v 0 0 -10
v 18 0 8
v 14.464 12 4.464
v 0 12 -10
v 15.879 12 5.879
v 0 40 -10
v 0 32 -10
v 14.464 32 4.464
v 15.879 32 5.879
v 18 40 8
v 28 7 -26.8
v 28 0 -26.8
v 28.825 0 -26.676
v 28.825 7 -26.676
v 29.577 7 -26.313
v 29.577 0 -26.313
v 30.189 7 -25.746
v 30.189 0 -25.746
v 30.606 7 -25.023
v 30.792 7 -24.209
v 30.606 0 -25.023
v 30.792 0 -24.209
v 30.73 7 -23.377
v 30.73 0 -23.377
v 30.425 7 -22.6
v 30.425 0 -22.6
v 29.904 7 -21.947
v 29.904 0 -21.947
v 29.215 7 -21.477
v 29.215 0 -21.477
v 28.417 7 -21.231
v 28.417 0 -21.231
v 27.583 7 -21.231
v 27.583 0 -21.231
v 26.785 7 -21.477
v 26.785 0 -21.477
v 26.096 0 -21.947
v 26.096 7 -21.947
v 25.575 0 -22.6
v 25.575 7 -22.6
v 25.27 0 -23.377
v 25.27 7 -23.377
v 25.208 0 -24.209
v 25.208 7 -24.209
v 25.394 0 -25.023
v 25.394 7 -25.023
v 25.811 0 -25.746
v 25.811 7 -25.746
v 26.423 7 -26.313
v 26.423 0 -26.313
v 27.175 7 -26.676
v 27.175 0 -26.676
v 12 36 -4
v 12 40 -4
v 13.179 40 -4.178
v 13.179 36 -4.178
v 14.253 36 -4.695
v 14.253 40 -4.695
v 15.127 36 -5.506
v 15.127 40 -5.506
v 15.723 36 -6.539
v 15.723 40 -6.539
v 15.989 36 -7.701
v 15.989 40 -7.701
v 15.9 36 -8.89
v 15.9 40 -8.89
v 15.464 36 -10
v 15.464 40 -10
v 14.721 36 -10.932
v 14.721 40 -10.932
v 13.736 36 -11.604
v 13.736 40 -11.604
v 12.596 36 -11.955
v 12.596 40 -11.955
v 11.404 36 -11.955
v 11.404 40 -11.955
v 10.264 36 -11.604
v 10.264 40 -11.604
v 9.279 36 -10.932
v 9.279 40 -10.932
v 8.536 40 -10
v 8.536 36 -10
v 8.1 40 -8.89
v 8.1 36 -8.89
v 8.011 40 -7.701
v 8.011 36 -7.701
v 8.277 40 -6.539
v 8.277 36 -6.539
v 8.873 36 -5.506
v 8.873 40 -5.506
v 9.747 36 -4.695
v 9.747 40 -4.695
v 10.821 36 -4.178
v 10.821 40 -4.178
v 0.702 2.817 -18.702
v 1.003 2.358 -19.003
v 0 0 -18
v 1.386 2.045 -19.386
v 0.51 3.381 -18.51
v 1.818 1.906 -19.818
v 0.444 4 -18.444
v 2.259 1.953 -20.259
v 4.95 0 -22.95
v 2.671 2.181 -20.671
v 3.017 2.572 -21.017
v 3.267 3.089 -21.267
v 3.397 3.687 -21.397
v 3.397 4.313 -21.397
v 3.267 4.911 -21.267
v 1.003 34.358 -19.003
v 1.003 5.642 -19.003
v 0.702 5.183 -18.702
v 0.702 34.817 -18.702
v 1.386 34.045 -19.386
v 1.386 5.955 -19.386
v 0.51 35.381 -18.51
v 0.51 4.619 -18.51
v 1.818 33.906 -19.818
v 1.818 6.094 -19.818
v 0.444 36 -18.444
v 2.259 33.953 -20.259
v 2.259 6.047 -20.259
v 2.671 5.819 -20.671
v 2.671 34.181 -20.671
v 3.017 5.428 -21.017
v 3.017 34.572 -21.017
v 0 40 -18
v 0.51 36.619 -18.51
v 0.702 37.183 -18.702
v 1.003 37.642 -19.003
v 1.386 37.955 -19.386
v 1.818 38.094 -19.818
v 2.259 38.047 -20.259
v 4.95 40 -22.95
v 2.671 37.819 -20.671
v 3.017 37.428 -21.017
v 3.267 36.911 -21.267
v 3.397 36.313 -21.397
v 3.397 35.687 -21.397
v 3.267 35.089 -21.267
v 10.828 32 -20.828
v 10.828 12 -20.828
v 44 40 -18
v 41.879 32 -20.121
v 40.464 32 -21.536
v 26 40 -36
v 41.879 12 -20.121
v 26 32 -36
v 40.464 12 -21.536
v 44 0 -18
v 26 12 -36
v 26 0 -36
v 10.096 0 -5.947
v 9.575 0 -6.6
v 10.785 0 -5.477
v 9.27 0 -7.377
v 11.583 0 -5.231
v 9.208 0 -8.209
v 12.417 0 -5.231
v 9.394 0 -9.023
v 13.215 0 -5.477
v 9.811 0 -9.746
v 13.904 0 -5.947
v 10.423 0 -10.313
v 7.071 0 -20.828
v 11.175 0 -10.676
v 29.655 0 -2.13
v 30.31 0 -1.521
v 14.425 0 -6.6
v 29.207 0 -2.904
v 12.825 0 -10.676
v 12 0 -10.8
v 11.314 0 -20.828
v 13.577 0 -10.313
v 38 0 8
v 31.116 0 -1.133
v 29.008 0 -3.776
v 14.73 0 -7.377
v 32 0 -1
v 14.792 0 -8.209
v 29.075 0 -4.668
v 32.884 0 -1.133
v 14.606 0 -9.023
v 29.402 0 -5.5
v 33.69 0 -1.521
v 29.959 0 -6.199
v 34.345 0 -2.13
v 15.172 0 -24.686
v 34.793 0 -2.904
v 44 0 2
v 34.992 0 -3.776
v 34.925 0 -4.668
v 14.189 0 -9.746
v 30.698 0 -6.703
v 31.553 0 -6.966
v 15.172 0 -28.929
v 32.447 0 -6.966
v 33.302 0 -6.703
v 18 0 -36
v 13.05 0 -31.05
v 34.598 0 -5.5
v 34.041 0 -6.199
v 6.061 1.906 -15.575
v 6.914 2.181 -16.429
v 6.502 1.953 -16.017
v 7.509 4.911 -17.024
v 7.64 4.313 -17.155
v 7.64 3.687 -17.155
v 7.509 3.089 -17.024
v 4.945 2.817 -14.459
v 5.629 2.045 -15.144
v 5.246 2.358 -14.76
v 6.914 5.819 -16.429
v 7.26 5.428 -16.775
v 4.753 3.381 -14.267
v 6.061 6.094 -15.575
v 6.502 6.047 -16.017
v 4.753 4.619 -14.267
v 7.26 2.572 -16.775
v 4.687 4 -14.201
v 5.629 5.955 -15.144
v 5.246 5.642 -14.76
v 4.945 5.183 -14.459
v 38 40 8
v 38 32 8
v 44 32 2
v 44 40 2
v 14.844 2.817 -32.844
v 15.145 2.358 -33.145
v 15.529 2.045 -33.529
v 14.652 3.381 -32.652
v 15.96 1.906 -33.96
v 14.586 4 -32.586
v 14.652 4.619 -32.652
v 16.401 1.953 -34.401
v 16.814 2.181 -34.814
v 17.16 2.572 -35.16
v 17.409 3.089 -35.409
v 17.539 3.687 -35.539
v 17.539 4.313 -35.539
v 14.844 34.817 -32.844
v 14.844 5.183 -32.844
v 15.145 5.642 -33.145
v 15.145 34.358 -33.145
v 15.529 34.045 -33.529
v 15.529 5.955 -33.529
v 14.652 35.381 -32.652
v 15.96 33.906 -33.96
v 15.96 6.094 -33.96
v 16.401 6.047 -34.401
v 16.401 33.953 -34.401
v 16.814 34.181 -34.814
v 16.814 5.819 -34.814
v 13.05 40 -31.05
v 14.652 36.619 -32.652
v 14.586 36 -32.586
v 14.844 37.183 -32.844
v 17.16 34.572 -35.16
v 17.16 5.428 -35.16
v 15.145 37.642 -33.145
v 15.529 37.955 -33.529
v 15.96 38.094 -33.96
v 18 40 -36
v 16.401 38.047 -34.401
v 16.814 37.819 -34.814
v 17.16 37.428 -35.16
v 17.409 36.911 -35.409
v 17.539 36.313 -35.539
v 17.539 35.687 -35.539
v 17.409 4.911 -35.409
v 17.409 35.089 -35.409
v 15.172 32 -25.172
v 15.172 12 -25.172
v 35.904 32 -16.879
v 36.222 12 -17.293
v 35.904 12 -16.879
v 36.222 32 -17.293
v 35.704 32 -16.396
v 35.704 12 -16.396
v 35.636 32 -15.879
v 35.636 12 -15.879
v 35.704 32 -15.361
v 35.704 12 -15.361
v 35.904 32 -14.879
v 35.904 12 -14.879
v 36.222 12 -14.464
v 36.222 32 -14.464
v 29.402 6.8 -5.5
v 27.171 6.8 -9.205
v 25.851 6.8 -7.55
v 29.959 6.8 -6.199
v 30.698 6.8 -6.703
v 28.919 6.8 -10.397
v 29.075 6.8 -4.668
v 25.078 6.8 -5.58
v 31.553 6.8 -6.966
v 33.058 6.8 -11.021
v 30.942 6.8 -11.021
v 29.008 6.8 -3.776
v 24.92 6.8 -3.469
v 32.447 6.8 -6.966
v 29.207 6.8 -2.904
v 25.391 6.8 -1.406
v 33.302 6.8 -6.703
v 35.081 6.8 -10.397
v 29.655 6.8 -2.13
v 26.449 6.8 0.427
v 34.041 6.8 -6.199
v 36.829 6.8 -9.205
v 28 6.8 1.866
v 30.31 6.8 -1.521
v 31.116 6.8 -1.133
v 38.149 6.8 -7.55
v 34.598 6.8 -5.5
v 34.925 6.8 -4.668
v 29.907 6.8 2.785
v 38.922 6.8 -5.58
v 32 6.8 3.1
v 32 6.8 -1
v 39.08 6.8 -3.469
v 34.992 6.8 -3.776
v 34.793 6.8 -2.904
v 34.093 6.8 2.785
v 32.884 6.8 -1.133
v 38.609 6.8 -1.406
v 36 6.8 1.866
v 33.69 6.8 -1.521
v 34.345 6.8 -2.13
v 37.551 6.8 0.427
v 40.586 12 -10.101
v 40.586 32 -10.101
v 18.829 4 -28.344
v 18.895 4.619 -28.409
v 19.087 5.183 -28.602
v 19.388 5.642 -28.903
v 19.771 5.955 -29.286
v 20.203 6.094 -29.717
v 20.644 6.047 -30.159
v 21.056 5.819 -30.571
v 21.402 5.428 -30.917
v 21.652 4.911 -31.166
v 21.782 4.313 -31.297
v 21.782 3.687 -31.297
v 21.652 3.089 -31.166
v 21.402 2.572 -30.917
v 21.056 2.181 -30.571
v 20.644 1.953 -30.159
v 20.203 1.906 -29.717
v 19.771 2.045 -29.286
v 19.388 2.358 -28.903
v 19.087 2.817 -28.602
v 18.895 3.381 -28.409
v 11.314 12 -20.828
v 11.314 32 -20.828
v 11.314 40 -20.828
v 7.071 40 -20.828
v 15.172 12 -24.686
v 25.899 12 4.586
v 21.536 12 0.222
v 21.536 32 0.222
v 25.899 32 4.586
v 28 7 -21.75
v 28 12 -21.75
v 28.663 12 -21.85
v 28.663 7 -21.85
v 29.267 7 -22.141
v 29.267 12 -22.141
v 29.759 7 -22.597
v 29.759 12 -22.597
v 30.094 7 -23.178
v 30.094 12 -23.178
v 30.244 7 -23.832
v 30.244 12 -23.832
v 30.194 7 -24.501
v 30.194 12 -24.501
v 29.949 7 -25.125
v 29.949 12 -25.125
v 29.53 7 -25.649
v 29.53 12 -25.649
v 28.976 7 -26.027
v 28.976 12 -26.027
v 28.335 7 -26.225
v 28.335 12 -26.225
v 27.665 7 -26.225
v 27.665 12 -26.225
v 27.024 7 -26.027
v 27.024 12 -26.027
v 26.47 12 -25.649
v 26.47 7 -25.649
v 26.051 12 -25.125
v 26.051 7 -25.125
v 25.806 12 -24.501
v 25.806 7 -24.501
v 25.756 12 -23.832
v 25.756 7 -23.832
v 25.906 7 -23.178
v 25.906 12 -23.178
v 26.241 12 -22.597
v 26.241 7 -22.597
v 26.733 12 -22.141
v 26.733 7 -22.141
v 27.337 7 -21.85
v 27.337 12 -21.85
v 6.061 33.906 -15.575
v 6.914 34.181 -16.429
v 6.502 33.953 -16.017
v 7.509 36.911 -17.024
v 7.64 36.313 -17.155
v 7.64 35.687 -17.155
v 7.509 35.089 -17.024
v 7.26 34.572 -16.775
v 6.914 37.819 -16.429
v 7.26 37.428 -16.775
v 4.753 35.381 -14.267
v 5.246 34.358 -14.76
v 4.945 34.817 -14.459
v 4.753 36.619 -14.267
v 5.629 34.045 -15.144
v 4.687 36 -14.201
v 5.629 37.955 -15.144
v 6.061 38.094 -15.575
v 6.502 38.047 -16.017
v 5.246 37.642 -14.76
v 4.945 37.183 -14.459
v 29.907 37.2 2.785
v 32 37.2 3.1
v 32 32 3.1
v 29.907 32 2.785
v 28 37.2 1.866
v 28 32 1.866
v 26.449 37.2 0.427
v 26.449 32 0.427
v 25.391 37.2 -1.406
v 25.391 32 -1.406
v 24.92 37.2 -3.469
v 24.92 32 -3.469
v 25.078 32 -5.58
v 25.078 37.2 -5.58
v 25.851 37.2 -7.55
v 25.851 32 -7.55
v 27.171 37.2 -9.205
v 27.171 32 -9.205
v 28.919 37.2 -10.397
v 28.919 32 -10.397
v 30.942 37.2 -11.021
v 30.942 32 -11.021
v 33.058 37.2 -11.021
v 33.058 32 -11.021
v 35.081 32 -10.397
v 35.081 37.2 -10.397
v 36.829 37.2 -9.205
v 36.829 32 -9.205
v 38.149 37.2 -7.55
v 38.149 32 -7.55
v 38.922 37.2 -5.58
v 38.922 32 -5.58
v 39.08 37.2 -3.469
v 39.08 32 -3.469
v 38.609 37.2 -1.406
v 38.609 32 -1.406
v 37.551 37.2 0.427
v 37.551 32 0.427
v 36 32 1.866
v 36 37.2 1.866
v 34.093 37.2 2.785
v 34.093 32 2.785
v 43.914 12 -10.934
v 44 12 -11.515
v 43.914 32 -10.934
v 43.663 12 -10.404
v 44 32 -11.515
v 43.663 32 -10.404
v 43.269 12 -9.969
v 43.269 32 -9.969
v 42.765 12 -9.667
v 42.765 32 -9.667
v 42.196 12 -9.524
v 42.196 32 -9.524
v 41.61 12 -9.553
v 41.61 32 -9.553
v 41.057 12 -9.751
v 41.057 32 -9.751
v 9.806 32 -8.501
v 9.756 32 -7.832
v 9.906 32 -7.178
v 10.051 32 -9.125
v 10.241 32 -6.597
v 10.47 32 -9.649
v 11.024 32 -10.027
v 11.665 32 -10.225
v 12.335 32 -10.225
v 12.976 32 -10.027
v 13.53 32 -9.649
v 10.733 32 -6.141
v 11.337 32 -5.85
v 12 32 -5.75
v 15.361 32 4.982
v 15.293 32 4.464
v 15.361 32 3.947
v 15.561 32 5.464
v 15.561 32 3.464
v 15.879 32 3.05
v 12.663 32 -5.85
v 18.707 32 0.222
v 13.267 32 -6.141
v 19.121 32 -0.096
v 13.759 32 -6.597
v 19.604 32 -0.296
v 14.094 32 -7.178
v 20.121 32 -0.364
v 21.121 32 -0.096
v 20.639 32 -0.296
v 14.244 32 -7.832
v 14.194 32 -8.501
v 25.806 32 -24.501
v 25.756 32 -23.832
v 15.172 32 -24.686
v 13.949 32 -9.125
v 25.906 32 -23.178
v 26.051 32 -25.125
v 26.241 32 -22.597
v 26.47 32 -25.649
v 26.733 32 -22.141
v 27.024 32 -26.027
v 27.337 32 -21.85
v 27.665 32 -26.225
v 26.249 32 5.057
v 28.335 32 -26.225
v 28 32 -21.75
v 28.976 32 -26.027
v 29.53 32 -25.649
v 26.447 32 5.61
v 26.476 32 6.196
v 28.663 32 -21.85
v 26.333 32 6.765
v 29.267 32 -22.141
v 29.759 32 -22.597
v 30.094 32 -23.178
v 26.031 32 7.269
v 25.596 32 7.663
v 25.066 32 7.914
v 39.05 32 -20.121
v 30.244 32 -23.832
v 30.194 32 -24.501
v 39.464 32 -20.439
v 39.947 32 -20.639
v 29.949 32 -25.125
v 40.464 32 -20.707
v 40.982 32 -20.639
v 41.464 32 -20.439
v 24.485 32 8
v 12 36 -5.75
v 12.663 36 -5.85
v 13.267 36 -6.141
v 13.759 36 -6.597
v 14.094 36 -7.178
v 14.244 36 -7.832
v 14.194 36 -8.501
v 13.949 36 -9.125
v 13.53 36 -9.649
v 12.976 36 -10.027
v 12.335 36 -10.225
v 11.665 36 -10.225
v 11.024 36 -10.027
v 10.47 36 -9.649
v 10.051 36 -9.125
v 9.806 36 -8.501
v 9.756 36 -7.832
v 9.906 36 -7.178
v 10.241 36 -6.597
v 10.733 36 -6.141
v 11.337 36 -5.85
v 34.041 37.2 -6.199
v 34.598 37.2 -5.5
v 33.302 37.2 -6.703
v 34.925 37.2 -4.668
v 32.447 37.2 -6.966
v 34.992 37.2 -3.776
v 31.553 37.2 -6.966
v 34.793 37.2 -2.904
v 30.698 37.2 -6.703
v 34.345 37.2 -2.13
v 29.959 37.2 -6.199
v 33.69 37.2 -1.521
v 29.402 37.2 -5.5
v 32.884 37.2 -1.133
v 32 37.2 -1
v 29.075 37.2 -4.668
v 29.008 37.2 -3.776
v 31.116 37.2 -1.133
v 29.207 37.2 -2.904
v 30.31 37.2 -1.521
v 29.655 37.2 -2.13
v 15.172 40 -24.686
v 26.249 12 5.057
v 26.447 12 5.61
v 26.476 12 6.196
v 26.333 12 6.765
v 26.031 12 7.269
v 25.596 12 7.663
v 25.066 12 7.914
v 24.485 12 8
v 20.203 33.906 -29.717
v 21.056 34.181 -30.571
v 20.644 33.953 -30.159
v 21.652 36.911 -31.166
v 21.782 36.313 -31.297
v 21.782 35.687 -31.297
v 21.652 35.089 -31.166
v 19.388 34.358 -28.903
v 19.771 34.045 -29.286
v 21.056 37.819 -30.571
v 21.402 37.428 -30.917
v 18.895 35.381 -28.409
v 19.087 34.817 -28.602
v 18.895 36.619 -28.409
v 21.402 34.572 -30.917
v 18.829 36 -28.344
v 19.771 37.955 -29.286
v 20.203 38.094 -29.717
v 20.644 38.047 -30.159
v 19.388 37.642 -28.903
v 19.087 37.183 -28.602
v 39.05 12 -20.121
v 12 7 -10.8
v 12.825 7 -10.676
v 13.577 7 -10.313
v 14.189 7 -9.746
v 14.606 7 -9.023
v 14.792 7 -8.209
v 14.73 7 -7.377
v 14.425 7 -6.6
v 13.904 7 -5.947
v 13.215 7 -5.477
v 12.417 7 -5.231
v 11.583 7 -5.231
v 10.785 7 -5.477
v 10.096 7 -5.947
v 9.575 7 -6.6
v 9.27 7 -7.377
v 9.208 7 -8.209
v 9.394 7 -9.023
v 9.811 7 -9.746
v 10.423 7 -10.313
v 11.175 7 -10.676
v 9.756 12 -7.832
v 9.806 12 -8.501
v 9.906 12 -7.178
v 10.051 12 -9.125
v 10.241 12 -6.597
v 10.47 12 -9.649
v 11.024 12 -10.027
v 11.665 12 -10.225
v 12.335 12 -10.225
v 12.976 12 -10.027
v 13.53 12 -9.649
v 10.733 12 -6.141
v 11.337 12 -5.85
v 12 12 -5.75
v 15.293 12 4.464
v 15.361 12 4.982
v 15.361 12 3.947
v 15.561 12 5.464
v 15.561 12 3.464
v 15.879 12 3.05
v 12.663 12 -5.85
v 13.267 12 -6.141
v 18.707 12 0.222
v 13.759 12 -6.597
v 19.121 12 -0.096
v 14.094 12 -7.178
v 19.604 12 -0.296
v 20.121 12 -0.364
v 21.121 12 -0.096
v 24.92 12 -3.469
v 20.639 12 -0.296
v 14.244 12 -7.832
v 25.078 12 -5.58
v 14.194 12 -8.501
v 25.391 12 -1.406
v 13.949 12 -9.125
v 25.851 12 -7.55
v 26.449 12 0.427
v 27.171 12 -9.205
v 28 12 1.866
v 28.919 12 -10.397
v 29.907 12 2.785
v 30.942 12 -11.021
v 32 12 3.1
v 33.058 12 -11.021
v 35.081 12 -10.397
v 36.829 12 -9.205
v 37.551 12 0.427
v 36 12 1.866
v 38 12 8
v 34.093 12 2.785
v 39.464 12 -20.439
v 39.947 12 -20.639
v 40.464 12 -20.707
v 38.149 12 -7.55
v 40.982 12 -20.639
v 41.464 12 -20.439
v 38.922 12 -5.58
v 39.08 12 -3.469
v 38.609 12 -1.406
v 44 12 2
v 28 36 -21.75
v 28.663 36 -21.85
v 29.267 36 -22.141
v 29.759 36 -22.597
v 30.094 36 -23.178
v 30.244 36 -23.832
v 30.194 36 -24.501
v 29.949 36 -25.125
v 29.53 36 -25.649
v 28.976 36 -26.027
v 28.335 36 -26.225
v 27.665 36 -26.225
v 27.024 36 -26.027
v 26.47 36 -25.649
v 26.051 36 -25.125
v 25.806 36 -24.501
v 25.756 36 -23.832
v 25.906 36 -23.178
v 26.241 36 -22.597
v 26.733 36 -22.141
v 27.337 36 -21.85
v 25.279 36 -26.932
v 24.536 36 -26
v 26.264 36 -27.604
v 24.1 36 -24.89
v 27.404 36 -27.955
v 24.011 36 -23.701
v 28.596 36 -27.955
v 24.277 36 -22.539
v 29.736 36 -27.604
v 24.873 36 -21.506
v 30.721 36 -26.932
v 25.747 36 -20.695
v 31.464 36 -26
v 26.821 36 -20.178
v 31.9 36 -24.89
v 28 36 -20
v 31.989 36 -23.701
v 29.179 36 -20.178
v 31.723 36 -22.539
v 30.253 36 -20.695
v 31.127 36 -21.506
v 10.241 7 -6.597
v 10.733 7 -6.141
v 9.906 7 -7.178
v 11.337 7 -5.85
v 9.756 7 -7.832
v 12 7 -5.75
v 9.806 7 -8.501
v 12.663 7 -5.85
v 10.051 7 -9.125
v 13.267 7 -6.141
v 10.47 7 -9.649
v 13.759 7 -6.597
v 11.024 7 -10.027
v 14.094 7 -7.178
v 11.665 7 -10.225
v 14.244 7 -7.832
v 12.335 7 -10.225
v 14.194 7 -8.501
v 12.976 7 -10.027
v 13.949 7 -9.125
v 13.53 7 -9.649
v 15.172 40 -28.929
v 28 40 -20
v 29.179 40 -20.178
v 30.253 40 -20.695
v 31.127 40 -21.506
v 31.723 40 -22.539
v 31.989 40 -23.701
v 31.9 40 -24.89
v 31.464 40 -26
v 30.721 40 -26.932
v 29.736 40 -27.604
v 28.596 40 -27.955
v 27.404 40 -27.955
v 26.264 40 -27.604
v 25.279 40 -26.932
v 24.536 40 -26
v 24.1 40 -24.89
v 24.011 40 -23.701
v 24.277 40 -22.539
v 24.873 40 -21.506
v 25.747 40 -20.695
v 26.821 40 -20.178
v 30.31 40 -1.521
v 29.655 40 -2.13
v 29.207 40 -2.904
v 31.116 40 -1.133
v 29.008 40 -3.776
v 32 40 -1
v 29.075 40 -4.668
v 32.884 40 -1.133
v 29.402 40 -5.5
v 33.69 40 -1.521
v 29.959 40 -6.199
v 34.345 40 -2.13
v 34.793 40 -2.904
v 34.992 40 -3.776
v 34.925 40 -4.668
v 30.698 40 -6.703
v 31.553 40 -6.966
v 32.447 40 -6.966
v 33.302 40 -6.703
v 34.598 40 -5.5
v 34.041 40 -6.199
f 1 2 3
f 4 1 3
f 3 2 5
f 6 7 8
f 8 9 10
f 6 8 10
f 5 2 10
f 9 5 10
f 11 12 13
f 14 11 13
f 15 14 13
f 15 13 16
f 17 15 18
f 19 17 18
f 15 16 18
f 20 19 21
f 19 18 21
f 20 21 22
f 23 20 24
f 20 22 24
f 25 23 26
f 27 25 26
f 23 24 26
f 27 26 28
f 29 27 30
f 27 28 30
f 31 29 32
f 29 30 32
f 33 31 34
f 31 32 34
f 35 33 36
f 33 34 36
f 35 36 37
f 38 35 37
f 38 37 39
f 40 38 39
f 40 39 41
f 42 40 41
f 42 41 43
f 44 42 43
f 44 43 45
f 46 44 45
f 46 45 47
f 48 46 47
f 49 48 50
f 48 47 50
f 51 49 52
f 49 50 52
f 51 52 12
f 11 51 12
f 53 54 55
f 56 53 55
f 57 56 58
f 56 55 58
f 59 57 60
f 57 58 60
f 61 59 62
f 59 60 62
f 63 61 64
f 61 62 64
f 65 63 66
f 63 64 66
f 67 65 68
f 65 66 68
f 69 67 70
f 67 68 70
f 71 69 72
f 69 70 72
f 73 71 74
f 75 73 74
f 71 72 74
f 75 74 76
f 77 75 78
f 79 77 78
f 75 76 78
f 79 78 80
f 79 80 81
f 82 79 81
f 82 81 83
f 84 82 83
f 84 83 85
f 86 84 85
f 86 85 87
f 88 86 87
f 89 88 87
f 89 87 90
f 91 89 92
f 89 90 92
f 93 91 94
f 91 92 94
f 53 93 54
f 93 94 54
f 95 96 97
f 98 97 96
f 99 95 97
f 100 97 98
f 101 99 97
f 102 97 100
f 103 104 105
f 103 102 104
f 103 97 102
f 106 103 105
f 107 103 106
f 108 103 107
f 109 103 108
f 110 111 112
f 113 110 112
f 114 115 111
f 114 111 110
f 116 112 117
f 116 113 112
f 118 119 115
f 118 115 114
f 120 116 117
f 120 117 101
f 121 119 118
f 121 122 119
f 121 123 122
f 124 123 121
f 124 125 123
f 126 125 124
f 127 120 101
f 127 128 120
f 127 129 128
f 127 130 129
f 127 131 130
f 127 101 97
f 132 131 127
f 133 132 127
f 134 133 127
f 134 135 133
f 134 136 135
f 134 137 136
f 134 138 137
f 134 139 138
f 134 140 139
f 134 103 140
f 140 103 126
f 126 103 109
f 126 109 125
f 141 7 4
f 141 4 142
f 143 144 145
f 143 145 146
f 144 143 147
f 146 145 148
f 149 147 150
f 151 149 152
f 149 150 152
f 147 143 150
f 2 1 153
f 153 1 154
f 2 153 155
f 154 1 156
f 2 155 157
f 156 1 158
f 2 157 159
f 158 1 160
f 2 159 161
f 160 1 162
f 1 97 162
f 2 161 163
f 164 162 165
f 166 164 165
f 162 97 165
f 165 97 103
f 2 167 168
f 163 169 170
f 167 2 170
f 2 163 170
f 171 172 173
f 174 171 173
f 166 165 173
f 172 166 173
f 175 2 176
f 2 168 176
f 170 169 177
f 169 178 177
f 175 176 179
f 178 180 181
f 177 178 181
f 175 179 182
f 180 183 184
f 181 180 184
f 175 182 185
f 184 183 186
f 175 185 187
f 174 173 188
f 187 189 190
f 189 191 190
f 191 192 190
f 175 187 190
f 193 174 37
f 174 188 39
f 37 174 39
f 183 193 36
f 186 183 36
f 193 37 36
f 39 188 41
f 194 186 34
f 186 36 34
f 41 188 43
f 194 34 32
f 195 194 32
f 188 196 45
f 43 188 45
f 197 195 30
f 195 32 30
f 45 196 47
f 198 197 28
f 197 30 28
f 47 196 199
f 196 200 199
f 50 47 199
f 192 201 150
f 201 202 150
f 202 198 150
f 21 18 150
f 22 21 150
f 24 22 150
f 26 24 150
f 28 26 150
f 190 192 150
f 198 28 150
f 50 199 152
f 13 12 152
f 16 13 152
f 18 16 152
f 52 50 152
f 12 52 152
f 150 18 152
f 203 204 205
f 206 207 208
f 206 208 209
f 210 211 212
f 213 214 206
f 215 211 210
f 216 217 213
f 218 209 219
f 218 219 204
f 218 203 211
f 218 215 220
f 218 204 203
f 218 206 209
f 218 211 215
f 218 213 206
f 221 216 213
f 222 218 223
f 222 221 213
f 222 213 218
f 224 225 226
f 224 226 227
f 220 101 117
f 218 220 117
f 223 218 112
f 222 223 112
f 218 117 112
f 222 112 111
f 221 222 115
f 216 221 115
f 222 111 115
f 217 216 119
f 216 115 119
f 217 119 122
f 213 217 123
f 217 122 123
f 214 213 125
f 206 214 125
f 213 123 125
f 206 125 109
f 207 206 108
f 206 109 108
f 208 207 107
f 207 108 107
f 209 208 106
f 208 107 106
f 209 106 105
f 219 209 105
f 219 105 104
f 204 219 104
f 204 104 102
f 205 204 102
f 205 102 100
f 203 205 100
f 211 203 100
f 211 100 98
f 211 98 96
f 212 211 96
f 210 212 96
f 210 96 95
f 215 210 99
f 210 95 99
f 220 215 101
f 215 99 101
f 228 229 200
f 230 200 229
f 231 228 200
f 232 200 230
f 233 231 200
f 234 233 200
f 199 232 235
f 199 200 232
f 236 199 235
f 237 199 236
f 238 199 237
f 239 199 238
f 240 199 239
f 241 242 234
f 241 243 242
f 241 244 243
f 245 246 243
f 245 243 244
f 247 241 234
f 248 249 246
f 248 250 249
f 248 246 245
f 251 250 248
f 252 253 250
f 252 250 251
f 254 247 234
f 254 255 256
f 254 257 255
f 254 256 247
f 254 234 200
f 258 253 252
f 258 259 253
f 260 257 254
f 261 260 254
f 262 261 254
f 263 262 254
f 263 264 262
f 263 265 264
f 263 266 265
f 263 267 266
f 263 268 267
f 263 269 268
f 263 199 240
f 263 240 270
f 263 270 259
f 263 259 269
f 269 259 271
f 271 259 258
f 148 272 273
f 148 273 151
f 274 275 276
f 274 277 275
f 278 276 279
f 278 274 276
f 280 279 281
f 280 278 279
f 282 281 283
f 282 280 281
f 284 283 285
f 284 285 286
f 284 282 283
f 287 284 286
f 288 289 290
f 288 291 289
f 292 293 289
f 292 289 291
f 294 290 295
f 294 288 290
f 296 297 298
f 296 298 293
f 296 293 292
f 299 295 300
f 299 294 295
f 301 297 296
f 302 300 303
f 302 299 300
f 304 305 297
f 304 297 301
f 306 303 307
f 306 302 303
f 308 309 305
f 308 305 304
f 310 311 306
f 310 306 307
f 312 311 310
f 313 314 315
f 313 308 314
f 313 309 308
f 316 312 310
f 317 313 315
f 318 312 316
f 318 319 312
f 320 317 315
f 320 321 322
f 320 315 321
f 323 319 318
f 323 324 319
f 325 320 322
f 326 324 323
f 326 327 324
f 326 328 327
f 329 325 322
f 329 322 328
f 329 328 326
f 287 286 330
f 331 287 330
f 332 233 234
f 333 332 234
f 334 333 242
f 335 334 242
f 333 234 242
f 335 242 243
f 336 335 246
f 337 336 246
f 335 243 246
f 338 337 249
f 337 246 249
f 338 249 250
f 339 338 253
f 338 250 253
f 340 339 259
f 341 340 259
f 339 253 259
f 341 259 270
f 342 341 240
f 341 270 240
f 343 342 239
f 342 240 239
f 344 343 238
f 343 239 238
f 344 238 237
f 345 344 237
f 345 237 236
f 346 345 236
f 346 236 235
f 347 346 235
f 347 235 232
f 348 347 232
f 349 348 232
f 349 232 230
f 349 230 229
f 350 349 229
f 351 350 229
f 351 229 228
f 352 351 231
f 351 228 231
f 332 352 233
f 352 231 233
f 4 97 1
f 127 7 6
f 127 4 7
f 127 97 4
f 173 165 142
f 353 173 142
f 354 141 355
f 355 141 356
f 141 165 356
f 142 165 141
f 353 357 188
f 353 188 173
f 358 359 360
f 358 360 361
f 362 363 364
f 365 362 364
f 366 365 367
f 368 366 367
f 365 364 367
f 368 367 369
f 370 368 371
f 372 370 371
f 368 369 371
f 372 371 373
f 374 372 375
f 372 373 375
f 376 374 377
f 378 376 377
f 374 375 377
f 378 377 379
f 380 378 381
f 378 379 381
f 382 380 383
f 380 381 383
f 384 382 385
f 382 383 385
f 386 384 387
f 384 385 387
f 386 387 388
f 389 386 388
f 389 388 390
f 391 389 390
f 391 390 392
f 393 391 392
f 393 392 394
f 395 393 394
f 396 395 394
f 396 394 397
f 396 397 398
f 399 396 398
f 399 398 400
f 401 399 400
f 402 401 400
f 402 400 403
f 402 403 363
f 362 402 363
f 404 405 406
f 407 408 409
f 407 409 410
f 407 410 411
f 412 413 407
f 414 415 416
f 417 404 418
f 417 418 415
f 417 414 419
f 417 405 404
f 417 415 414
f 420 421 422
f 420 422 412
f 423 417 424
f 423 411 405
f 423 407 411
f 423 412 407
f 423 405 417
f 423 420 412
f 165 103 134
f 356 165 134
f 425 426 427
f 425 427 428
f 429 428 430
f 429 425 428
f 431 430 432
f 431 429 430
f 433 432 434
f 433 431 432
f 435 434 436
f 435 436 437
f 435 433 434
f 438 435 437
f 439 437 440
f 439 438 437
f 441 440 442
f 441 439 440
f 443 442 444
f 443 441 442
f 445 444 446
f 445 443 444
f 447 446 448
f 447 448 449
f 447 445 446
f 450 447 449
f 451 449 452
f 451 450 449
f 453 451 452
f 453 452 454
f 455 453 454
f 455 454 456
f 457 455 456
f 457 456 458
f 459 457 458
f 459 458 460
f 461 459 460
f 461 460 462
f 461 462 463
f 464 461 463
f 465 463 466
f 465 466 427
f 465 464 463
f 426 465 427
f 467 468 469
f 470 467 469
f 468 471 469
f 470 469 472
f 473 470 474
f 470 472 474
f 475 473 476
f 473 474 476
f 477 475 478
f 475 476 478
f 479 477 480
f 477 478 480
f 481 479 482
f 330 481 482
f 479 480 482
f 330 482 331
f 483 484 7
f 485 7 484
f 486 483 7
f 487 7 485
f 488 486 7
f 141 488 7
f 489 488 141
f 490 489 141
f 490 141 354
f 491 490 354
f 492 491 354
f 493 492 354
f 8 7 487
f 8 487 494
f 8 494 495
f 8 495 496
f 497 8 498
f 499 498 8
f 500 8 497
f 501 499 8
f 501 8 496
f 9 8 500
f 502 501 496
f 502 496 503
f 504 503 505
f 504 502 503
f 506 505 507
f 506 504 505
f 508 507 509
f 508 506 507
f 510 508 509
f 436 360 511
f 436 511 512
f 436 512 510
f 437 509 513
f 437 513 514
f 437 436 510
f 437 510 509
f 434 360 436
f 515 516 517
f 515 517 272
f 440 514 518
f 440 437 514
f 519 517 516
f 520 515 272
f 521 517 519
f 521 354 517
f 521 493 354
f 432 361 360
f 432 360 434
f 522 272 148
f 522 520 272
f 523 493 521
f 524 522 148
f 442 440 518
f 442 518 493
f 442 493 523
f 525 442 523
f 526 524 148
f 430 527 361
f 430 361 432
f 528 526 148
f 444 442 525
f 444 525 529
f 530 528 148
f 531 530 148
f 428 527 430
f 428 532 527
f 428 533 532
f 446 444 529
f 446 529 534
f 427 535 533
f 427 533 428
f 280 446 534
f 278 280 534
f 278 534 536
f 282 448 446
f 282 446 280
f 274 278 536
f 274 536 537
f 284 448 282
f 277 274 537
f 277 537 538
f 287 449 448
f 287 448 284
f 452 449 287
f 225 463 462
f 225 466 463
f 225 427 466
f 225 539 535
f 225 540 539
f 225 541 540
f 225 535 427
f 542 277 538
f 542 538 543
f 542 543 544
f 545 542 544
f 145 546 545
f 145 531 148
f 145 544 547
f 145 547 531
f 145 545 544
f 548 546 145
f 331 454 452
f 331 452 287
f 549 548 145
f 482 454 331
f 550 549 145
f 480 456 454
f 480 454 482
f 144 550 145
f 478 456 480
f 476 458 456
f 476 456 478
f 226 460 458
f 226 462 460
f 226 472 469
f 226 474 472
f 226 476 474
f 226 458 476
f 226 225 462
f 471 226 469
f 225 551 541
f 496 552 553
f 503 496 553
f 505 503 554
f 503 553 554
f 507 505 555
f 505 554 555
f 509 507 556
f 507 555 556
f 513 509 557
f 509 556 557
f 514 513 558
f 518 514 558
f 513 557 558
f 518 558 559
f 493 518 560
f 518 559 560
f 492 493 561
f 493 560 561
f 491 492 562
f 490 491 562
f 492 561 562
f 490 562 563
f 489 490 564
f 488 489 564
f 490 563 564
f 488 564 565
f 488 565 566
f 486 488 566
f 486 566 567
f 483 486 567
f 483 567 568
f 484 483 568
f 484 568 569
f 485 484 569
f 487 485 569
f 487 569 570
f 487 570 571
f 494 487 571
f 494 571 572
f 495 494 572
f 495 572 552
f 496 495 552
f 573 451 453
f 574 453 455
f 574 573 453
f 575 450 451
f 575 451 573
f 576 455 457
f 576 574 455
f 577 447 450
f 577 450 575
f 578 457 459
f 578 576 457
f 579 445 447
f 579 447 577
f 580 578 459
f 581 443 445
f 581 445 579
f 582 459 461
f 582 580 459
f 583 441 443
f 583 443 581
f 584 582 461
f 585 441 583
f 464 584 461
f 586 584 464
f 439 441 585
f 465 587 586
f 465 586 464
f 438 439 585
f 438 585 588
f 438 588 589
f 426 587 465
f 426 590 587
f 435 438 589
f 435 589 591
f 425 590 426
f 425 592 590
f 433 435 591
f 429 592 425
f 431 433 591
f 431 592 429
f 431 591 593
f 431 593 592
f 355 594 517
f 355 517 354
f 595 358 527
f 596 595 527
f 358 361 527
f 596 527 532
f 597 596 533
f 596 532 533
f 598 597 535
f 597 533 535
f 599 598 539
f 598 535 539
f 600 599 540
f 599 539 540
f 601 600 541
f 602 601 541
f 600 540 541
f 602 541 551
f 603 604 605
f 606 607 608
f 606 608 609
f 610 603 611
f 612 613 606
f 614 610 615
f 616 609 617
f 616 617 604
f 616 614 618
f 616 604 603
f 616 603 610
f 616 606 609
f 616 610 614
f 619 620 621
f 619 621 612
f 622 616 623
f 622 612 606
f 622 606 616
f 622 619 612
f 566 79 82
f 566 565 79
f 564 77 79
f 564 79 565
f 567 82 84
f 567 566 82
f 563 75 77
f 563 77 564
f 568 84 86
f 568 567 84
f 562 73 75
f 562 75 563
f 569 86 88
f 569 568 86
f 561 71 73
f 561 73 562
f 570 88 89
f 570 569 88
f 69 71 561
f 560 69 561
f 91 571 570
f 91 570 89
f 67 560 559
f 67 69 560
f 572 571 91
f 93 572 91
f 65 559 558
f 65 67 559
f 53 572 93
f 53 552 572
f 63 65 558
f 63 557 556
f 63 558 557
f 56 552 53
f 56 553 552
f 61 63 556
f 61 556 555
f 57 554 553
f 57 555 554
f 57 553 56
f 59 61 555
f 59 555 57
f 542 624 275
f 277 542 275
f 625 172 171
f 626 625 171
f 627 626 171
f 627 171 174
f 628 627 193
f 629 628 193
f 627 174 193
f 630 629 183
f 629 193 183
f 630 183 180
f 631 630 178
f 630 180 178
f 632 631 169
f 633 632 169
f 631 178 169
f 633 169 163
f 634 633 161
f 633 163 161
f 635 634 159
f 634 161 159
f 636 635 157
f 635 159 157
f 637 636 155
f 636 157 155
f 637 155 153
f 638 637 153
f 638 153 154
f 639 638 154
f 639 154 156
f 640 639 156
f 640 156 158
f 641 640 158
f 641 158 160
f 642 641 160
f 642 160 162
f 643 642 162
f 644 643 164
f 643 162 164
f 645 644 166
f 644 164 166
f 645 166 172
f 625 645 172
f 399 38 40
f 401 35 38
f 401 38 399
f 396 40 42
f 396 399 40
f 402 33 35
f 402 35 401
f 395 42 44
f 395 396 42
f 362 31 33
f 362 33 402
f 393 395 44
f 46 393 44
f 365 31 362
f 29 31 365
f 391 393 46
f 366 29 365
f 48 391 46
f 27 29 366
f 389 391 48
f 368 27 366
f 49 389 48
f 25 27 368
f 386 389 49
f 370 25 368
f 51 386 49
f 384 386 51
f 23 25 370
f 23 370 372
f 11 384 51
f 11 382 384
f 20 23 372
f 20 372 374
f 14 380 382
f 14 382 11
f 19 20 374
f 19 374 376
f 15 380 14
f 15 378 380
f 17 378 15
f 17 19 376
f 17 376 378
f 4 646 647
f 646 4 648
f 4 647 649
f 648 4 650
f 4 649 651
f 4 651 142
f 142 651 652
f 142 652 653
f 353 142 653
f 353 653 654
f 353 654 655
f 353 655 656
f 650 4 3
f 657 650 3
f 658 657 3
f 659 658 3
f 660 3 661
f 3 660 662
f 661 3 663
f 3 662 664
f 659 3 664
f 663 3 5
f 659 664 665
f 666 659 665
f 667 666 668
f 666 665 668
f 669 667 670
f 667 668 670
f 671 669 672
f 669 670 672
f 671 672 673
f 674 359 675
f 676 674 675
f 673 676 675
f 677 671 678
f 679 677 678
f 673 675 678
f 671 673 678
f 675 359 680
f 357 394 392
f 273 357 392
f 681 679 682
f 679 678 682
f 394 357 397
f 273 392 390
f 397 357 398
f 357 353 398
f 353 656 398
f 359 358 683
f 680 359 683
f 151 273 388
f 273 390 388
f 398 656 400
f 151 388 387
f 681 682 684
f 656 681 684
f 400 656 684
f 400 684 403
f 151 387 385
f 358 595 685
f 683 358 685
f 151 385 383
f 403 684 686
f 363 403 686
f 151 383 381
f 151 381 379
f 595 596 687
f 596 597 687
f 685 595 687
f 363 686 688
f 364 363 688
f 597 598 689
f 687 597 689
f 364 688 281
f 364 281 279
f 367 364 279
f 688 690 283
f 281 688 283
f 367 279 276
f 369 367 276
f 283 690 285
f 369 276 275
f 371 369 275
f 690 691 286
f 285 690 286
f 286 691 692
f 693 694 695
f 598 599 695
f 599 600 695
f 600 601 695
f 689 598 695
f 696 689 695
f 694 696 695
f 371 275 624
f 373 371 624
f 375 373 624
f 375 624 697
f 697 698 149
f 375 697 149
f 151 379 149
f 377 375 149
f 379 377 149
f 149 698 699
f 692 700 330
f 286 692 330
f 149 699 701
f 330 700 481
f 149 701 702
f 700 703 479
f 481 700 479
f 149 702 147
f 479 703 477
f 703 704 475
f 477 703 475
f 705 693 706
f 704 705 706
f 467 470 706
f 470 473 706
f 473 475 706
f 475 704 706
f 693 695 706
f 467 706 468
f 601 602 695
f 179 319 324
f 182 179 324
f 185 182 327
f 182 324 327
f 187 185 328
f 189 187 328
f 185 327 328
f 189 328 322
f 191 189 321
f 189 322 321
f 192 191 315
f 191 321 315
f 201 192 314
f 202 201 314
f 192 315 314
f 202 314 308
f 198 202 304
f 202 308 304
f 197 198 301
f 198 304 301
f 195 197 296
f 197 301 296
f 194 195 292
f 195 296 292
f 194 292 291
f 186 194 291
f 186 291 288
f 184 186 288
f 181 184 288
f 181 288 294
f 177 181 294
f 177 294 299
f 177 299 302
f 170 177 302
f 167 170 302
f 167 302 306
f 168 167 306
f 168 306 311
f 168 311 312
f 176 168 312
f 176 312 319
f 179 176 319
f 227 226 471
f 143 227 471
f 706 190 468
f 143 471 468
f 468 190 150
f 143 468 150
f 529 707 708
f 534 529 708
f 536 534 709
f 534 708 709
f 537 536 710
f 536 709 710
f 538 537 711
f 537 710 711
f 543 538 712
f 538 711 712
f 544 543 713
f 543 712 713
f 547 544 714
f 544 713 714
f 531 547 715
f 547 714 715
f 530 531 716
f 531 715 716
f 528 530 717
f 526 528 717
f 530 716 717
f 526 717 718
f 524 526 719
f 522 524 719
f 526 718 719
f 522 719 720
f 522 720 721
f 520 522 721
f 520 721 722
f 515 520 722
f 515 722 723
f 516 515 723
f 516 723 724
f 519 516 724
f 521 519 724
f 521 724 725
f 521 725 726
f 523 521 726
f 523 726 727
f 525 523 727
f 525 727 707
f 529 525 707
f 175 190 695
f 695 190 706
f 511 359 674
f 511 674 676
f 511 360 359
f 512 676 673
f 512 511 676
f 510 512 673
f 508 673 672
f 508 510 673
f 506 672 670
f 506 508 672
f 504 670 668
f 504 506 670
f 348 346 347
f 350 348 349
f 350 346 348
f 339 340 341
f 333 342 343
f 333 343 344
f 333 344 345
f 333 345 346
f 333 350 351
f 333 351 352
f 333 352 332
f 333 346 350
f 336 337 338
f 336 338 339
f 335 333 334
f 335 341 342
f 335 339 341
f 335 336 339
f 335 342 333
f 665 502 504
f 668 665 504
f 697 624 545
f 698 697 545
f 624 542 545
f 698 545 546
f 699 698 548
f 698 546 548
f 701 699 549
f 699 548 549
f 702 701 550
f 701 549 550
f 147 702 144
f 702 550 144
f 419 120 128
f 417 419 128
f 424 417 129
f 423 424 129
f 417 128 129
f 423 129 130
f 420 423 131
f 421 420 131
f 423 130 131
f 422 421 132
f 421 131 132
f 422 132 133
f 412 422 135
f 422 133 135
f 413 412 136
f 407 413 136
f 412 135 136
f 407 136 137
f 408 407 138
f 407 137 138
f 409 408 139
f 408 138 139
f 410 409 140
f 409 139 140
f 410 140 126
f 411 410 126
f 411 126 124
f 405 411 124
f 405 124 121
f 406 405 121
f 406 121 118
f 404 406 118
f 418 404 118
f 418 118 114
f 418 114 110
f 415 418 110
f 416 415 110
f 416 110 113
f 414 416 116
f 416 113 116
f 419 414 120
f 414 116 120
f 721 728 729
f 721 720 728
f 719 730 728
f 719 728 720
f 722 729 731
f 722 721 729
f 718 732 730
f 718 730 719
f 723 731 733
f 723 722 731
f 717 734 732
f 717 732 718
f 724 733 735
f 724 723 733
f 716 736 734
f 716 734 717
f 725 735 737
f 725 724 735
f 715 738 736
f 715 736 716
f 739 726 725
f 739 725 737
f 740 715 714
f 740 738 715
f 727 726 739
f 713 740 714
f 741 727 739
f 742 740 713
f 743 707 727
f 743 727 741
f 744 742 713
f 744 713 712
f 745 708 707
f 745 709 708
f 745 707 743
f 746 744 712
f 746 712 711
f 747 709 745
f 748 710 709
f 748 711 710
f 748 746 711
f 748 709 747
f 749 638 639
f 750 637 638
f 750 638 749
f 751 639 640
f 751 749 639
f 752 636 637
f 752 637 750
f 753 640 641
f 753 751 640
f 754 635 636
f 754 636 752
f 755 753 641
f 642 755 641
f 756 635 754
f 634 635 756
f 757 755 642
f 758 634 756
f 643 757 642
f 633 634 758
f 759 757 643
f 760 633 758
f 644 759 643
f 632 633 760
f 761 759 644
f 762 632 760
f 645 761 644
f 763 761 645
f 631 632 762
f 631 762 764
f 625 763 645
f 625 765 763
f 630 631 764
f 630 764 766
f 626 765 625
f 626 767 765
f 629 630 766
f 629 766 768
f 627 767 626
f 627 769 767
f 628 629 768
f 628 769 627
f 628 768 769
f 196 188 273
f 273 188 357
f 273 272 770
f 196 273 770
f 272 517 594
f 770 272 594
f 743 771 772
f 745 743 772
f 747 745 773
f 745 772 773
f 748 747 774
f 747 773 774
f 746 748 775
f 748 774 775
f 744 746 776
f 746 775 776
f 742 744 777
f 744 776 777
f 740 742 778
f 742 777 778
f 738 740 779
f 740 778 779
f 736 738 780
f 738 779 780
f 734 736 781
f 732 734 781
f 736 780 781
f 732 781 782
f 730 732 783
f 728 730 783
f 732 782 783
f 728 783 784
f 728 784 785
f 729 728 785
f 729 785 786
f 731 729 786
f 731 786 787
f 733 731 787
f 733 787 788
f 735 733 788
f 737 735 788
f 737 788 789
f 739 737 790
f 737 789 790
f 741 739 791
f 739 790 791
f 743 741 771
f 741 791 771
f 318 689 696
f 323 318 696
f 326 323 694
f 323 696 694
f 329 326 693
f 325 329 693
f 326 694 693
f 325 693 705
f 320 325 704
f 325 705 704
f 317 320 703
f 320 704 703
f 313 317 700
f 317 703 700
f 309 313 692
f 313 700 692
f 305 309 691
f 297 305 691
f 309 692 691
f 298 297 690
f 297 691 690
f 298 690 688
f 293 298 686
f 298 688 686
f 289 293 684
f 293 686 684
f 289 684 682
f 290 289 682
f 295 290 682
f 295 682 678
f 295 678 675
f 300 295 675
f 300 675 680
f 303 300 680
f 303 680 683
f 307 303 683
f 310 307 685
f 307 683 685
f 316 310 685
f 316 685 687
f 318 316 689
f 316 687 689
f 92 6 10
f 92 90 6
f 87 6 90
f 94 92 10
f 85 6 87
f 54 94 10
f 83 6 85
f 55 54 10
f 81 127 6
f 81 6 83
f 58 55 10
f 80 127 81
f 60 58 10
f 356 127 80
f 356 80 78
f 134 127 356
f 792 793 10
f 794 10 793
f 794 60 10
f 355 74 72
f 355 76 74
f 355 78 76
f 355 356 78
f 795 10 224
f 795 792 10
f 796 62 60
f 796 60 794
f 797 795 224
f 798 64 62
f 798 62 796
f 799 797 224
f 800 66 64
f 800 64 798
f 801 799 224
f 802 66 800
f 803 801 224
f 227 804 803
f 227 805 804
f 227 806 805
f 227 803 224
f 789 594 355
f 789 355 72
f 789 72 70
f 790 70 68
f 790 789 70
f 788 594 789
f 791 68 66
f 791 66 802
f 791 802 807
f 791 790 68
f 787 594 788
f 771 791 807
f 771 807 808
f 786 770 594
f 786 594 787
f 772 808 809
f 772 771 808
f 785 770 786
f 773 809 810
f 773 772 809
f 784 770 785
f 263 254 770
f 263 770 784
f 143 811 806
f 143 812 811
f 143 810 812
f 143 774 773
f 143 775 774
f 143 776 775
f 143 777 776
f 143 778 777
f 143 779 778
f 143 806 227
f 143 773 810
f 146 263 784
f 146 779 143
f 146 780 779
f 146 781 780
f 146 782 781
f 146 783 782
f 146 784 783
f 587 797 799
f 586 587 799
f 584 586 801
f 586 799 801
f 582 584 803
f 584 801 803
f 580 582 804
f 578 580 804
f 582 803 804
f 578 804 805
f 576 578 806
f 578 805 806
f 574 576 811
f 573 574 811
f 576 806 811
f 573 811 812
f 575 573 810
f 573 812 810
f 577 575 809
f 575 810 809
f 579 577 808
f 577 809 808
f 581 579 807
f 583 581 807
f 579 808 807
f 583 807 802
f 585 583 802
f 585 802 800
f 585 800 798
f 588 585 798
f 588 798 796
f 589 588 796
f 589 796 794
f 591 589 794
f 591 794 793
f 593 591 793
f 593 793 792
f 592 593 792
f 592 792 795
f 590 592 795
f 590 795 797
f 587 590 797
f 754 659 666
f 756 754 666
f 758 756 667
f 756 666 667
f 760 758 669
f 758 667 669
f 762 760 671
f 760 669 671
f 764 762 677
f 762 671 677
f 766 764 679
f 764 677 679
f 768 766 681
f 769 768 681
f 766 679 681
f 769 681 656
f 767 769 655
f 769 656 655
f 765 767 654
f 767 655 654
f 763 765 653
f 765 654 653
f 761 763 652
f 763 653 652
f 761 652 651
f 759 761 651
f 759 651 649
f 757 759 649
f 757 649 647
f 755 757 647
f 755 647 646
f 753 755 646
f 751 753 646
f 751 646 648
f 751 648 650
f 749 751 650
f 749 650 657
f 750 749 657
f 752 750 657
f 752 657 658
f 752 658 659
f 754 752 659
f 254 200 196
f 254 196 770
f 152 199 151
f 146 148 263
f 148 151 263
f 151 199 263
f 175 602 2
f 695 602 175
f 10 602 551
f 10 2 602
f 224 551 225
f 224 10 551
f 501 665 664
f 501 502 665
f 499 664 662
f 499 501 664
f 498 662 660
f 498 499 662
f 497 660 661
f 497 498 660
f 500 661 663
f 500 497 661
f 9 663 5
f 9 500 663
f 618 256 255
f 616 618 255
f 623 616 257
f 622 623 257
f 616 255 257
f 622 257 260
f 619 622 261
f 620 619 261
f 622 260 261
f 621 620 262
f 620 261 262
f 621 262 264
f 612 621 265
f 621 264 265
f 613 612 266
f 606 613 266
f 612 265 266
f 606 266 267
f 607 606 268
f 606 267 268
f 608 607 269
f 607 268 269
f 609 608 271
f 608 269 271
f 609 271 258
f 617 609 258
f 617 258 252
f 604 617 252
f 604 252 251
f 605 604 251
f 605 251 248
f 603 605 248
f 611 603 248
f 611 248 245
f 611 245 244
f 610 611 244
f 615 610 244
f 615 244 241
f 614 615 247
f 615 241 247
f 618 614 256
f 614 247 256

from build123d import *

# Parameters (mm, degrees)
SKETCH9_W           = 36
SKETCH9_H           = 36
BOSS_EXTRUDE1_DEPTH = 40
CHAMFER2_SIZE       = 18
SKETCH10_W          = 36
SKETCH10_H          = 40
BOSS_EXTRUDE2_DEPTH = 8
SKETCH12_W          = 44
SKETCH12_H          = 40
BOSS_EXTRUDE3_DEPTH = 8
CHAMFER3_SIZE       = 18
CHAMFER4_SIZE       = 6
SKETCH13_W          = 36.769552622
SKETCH13_H          = 20
CUT_EXTRUDE6_DEPTH  = 39.59798
SKETCH14_R          = 3
CUT_EXTRUDE7_DEPTH  = 70.512588881
SKETCH15_R          = 7.1
CUT_EXTRUDE8_DEPTH  = 5.2
CUT_EXTRUDE9_START  = -5.2
SKETCH16_R          = 7.1
CUT_EXTRUDE9_DEPTH  = 5.2
BOSS_EXTRUDE4_DEPTH = 20
FILLET1_R           = 2
SKETCH19_R          = 2.25
CUT_EXTRUDE10_DEPTH = 70.512588881
SKETCH20_R          = 2.8
CUT_EXTRUDE11_DEPTH = 7
SKETCH21_R          = 4
CUT_EXTRUDE12_DEPTH = 4
SKETCH22_R          = 2.1
CUT_EXTRUDE13_DEPTH = 6
SKETCH23_W          = 11.455844123
SKETCH23_H          = 40
CUT_EXTRUDE14_DEPTH = 6
CHAMFER5_SIZE       = 3


with BuildPart() as part:
    # Sketch9 → Boss-Extrude1 (new body)
    with BuildSketch(Plane(origin=(0, 0, 0), x_dir=(1, 0, 0), z_dir=(0, 1, 0))):
        with Locations((18, 18)):
            Rectangle(SKETCH9_W, SKETCH9_H)
    extrude(amount=BOSS_EXTRUDE1_DEPTH)

    # Chamfer2
    chamfer2_edges = [part.edges().sort_by_distance(p)[0] for p in [
        (0, 20, -36),
    ]]
    chamfer(chamfer2_edges, length=CHAMFER2_SIZE)

    # Sketch10 → Boss-Extrude2 (add)
    with BuildSketch(Plane(origin=(36, 0, 0), x_dir=(0, 0, -1), z_dir=(1, 0, 0))):
        with Locations((18, 20)):
            Rectangle(SKETCH10_W, SKETCH10_H)
    extrude(amount=BOSS_EXTRUDE2_DEPTH)

    # Sketch12 → Boss-Extrude3 (add)
    with BuildSketch(Plane.XY):
        with Locations((22, 20)):
            Rectangle(SKETCH12_W, SKETCH12_H)
    extrude(amount=BOSS_EXTRUDE3_DEPTH)

    # Chamfer3
    chamfer3_edges = [part.edges().sort_by_distance(p)[0] for p in [
        (44, 20, -36),
        (0, 20, 8),
    ]]
    chamfer(chamfer3_edges, length=CHAMFER3_SIZE)

    # Chamfer4
    chamfer4_edges = [part.edges().sort_by_distance(p)[0] for p in [
        (44, 20, 8),
    ]]
    chamfer(chamfer4_edges, length=CHAMFER4_SIZE)

    # Sketch13 → Cut-Extrude6 (cut)
    with BuildSketch(Plane(origin=(23, 0, 23), x_dir=(0.7071067811865465, 0, -0.7071067811865487), z_dir=(0.7071067811865487, 0, 0.7071067811865465))):
        with Locations((25.455844123, 22)):
            Rectangle(SKETCH13_W, SKETCH13_H)
    extrude(amount=-CUT_EXTRUDE6_DEPTH, mode=Mode.SUBTRACT)

    # Sketch14 → Cut-Extrude7 (cut, through all)
    with BuildSketch(Plane(origin=(0, 40, 0), x_dir=(1, 0, 0), z_dir=(0, 1, 0))):
        with Locations(Location((32, 4, 0), (0, 0, 270))):
            Circle(SKETCH14_R)
    extrude(amount=-CUT_EXTRUDE7_DEPTH, mode=Mode.SUBTRACT)

    # Sketch15 → Cut-Extrude8 (cut)
    with BuildSketch(Plane(origin=(0, 12, 0), x_dir=(1, 0, 0), z_dir=(0, 1, 0))):
        with Locations(Location((32, 4, 0), (0, 0, 270))):
            Circle(SKETCH15_R)
    extrude(amount=-CUT_EXTRUDE8_DEPTH, mode=Mode.SUBTRACT)

    # Sketch16 → Cut-Extrude9 (cut)
    with BuildSketch(Plane(origin=(0, 32, 0), x_dir=(-1, 0, 0), z_dir=(0, -1, 0)).offset(CUT_EXTRUDE9_START)):
        with Locations(Location((-32, 4, 0), (0, 0, 270))):
            Circle(SKETCH16_R)
    extrude(amount=CUT_EXTRUDE9_DEPTH, mode=Mode.SUBTRACT)

    # Sketch18 → Boss-Extrude4 (add)
    with BuildSketch(Plane(origin=(0, 12, 0), x_dir=(1, 0, 0), z_dir=(0, 1, 0))):
        Polygon((40.464466094, 21.535533906), (34.807611845, 15.878679656), (44, 6.686291501), (44, 18), align=None)
        Polygon((14.464466094, -4.464466094), (20.121320344, 1.192388155), (29.313708499, -8), (18, -8), align=None)
    extrude(amount=BOSS_EXTRUDE4_DEPTH)

    # Fillet1
    fillet1_edges = [part.edges().sort_by_distance(p)[0] for p in [
        (14.464466094, 22, 4.464466094),
        (29.313708499, 22, 8),
        (20.121320344, 22, -1.192388155),
        (44, 22, -6.686291501),
        (40.464466094, 22, -21.535533906),
        (34.807611845, 22, -15.878679656),
    ]]
    fillet(fillet1_edges, radius=FILLET1_R)

    # Sketch19 → Cut-Extrude10 (cut, through all)
    with BuildSketch(Plane(origin=(0, 40, 0), x_dir=(1, 0, 0), z_dir=(0, 1, 0))):
        with Locations(Location((12, 8, 0), (0, 0, 270))):
            Circle(SKETCH19_R)
        with Locations(Location((28, 24, 0), (0, 0, 270))):
            Circle(SKETCH19_R)
    extrude(amount=-CUT_EXTRUDE10_DEPTH, mode=Mode.SUBTRACT)

    # Sketch20 → Cut-Extrude11 (cut)
    with BuildSketch(Plane(origin=(0, 0, 0), x_dir=(-1, 0, 0), z_dir=(0, -1, 0))):
        with Locations(Location((-12, 8, 0), (0, 0, 90))):
            Circle(SKETCH20_R)
        with Locations(Location((-28, 24, 0), (0, 0, 90))):
            Circle(SKETCH20_R)
    extrude(amount=-CUT_EXTRUDE11_DEPTH, mode=Mode.SUBTRACT)

    # Sketch21 → Cut-Extrude12 (cut)
    with BuildSketch(Plane(origin=(0, 40, 0), x_dir=(1, 0, 0), z_dir=(0, 1, 0))):
        with Locations(Location((28, 24, 0), (0, 0, 270))):
            Circle(SKETCH21_R)
        with Locations(Location((12, 8, 0), (0, 0, 270))):
            Circle(SKETCH21_R)
    extrude(amount=-CUT_EXTRUDE12_DEPTH, mode=Mode.SUBTRACT)

    # Sketch22 → Cut-Extrude13 (cut)
    with BuildSketch(Plane(origin=(-9, 0, -9), x_dir=(-0.7071067811865487, 0, 0.7071067811865465), z_dir=(-0.7071067811865465, 0, -0.7071067811865487))):
        with Locations((-15.455844123, 36)):
            Circle(SKETCH22_R)
        with Locations((-35.455844123, 36)):
            Circle(SKETCH22_R)
        with Locations((-35.455844123, 4)):
            Circle(SKETCH22_R)
        with Locations((-15.455844123, 4)):
            Circle(SKETCH22_R)
    extrude(amount=-CUT_EXTRUDE13_DEPTH, mode=Mode.SUBTRACT)

    # Sketch23 → Cut-Extrude14 (cut)
    with BuildSketch(Plane(origin=(-9, 0, -9), x_dir=(-0.7071067811865487, 0, 0.7071067811865465), z_dir=(-0.7071067811865465, 0, -0.7071067811865487))):
        with Locations((-25.455844123, 20)):
            Rectangle(SKETCH23_W, SKETCH23_H)
    extrude(amount=-CUT_EXTRUDE14_DEPTH, mode=Mode.SUBTRACT)

    # Chamfer5
    chamfer5_edges = [part.edges().sort_by_distance(p)[0] for p in [
        (17.292893219, 6, -26.807611845),
        (9.192388155, 6, -18.707106781),
    ]]
    chamfer(chamfer5_edges, length=CHAMFER5_SIZE)


solid = part.part
